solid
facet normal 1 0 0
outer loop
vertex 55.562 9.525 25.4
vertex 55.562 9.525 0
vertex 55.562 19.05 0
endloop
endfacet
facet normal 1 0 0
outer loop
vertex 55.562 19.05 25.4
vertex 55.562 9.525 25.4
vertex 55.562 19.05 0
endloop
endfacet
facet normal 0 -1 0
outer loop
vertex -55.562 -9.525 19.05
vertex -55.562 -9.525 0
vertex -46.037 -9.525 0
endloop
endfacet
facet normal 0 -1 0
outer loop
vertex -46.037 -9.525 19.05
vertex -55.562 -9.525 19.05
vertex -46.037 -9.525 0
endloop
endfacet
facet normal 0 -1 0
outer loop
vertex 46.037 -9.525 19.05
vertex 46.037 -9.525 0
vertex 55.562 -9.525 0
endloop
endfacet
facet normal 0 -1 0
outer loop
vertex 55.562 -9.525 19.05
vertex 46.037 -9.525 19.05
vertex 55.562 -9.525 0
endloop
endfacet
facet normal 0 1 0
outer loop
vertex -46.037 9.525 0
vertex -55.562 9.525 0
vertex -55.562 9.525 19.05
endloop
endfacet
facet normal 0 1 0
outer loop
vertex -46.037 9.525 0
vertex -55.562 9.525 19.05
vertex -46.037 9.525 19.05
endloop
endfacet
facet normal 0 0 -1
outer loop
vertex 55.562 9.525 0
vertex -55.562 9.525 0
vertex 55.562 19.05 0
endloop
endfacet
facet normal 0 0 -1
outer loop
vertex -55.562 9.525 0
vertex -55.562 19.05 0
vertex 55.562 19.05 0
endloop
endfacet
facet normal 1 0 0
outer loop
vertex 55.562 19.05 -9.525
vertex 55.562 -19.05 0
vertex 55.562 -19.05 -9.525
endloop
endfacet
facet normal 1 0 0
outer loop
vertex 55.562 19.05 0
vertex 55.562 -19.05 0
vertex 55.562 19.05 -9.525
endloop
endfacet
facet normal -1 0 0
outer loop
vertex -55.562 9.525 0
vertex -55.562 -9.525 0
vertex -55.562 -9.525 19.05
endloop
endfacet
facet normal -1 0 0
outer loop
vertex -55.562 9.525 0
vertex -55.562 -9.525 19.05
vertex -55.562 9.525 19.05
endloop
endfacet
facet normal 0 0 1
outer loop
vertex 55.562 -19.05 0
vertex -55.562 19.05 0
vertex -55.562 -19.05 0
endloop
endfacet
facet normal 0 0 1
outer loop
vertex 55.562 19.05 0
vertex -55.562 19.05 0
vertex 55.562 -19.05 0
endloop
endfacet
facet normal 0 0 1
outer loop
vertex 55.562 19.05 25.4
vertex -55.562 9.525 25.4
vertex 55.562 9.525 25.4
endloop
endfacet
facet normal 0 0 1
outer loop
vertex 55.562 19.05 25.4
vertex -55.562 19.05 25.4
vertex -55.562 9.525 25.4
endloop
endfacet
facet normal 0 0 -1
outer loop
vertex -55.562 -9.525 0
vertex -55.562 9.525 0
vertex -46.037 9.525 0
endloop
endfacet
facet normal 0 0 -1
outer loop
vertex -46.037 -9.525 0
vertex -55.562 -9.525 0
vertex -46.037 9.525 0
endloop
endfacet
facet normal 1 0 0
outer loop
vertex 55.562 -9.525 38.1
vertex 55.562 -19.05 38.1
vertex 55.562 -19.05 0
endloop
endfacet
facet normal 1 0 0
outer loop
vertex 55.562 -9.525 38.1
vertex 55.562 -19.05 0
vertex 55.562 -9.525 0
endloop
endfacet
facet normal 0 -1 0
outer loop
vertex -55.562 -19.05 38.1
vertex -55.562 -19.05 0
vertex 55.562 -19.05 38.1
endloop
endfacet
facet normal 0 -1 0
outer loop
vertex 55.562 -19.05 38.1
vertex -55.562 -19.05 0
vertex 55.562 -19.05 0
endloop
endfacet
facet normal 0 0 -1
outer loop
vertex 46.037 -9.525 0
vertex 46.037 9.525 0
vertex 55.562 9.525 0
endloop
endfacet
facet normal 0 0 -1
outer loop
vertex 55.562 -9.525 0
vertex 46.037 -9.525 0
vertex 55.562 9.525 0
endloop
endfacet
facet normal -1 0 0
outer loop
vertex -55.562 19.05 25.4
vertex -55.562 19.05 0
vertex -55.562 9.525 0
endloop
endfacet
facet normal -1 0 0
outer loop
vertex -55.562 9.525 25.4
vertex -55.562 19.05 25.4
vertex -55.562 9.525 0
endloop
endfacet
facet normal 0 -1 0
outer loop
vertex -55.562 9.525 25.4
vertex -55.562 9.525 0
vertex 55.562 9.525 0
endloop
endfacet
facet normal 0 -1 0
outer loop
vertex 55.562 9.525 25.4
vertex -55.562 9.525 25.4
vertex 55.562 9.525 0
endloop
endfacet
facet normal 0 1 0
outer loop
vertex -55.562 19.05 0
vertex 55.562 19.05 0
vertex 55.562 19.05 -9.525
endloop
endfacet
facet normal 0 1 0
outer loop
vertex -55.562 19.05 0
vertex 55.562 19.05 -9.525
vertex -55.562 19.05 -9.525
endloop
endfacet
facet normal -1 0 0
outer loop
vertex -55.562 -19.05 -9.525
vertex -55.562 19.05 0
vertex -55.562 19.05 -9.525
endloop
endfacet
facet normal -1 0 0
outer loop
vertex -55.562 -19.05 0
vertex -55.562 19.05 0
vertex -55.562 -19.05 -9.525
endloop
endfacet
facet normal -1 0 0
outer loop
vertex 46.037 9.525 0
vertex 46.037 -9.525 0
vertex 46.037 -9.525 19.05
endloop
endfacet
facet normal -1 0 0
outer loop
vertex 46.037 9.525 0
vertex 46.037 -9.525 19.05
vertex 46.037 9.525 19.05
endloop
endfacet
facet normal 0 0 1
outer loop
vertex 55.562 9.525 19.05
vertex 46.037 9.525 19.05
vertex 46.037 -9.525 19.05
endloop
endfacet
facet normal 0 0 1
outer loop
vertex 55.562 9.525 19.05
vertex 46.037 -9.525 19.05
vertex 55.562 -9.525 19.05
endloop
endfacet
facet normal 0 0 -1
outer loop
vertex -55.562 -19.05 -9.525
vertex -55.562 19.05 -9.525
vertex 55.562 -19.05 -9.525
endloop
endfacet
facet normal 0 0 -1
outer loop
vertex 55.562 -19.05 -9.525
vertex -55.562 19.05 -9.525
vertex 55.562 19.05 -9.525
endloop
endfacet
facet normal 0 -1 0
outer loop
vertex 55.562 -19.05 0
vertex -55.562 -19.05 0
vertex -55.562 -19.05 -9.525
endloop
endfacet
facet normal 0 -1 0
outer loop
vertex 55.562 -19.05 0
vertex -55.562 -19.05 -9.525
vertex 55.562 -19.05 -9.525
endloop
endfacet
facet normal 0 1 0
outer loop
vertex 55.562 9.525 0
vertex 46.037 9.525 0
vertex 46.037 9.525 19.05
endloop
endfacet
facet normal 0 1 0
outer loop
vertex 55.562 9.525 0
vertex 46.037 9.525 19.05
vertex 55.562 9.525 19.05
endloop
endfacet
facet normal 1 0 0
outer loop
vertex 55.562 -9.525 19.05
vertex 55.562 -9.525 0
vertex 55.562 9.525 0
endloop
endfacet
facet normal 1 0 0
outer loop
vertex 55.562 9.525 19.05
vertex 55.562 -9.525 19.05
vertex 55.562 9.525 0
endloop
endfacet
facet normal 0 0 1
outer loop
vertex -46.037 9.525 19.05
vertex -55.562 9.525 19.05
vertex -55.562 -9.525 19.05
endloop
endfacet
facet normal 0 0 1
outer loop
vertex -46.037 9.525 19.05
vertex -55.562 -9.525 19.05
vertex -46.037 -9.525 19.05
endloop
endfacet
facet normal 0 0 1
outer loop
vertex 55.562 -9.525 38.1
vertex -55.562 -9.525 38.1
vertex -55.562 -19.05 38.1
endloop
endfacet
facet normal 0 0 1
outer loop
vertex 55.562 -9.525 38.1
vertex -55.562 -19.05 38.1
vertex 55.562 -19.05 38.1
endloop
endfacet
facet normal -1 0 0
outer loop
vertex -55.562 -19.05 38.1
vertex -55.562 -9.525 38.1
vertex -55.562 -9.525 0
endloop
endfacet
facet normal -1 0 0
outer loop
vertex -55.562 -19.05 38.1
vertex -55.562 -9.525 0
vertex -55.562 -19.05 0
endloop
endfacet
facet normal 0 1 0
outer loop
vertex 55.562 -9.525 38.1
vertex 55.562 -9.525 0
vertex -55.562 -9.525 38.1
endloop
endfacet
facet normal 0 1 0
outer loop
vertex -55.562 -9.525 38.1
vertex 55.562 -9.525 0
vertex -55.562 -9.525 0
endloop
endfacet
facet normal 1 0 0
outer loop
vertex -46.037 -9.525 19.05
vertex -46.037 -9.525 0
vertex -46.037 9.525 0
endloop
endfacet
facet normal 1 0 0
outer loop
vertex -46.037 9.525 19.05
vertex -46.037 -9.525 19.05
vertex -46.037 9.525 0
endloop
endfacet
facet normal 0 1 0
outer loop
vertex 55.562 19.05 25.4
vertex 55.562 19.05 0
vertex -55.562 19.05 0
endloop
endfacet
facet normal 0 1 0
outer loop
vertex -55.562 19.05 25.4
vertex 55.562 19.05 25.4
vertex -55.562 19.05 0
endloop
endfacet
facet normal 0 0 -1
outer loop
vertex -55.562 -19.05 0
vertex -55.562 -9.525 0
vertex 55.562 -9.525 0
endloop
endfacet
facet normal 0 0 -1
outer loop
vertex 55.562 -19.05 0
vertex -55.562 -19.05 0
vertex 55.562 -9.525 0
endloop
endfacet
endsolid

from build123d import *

# Parameters (mm, degrees)
F0_W     = 92.075
F0_H     = 19.05
F0_W_2   = 9.525
F1_DEPTH = 9.525
F2_DEPTH = 19.05
F3_DEPTH = 25.4
F4_DEPTH = 38.1


with BuildPart() as f1:
    # F0 (on Top) → F1 (new body)
    with BuildSketch(Plane.XY):
        Rectangle(F0_W, F0_H)
        Polygon((46.0375, -9.525), (-46.0375, -9.525), (-55.5625, -9.525), (-55.5625, -19.05), (55.5625, -19.05), (55.5625, -9.525), align=None)
        with Locations((50.8, 0)):
            Rectangle(F0_W_2, F0_H)
        Polygon((-55.5625, 9.525), (-46.0375, 9.525), (46.0375, 9.525), (55.5625, 9.525), (55.5625, 19.05), (-55.5625, 19.05), align=None)
        with Locations((-50.8, 0)):
            Rectangle(F0_W_2, F0_H)
    extrude(amount=-F1_DEPTH)


with BuildPart() as f2:
    # F0 (on Top) → F2 (new body)
    with BuildSketch(Plane.XY):
        with Locations((50.8, 0)):
            Rectangle(F0_W_2, F0_H)
        with Locations((-50.8, 0)):
            Rectangle(F0_W_2, F0_H)
    extrude(amount=F2_DEPTH)


with BuildPart() as f3:
    # F0 (on Top) → F3 (new body)
    with BuildSketch(Plane.XY):
        Polygon((-55.5625, 9.525), (-46.0375, 9.525), (46.0375, 9.525), (55.5625, 9.525), (55.5625, 19.05), (-55.5625, 19.05), align=None)
    extrude(amount=F3_DEPTH)


with BuildPart() as f4:
    # F0 (on Top) → F4 (new body)
    with BuildSketch(Plane.XY):
        Polygon((46.0375, -9.525), (-46.0375, -9.525), (-55.5625, -9.525), (-55.5625, -19.05), (55.5625, -19.05), (55.5625, -9.525), align=None)
    extrude(amount=F4_DEPTH)


solid = Compound([f1.part, f2.part, f3.part, f4.part])
